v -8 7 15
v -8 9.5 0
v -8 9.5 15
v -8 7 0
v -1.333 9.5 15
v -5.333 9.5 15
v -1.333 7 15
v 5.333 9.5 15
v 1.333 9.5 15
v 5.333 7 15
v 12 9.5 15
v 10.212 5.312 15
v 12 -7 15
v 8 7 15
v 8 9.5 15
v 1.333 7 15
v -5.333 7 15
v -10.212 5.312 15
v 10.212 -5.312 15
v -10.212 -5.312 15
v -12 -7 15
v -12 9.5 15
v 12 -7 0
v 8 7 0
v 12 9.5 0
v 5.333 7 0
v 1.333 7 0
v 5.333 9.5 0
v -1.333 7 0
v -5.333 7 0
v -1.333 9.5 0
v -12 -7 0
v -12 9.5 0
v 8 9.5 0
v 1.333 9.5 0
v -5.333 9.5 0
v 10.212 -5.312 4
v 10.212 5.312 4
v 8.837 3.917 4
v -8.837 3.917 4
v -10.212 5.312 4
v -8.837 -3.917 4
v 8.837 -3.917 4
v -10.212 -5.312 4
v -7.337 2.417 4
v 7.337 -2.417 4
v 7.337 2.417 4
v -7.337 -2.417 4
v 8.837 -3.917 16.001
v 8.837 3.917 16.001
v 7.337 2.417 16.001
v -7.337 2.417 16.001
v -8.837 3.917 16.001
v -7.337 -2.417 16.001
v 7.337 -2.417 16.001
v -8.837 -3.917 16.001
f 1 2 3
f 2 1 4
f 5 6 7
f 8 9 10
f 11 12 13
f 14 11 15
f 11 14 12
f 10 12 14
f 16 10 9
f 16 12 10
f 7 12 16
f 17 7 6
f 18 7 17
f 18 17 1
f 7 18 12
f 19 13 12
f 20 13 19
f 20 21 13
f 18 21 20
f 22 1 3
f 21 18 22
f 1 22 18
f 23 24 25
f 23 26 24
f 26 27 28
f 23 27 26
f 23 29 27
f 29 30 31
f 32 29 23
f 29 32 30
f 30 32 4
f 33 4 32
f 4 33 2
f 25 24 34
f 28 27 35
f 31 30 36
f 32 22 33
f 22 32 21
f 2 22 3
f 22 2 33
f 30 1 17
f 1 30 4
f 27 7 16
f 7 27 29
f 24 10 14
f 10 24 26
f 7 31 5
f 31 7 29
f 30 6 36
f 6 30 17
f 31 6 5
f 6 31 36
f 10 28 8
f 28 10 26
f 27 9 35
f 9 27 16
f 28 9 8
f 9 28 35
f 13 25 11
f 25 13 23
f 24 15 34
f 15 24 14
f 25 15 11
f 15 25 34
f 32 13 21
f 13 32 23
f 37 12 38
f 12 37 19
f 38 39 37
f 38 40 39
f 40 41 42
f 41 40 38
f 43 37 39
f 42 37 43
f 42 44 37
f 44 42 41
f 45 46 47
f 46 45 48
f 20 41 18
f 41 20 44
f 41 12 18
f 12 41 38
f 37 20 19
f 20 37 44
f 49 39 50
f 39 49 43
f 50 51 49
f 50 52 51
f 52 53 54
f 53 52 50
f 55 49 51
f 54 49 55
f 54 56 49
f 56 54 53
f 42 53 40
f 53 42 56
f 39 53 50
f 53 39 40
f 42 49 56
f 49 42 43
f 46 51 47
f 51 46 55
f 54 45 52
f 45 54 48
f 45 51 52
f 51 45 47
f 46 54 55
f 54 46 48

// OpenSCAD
$fn = 150;

///////// Variables
outside_h = 15;
inside_h = 16;

outside_cutout_w = 20.3 + .125;
outside_cutout_d = 10.5 + .125;
inside_cutout_w = 17.8 - .125;
inside_cutout_d = 7.96 - .125;

main_box_w = 24;
main_box_d = 14;
small_box_w = 4;
small_box_d = 2.5;

main_z_offset = outside_h / 2;
main_z_cutout_offset = main_z_offset + 4;
inside_z_offset = inside_h / 2;
inside_z_cutout_offset = main_z_cutout_offset;

///////// Code
difference() {
  translate([0, 0, main_z_offset]) {
    // Main box
    cube([main_box_w, main_box_d, outside_h], center=true);

    // Small boxes
    num_small_boxes = 4;
    // This formula distributes them evenly
    small_box_spacing = ( (main_box_w - small_box_w) / (num_small_boxes - 1));
    start = -(main_box_w / 2) + (small_box_w / 2);
    y_offset = (main_box_d / 2) + (small_box_d / 2);
    // Top boxes
    for (i = [0:3]) {
      translate([start + (small_box_spacing * i), y_offset, 0]) {
        cube([small_box_w, small_box_d, outside_h], center=true);
      }
    }
  }

  // Cutout to cover outside
  translate([0, 0, main_z_cutout_offset]) {
    cube([outside_cutout_w, outside_cutout_d, outside_h], center=true);
  }
}

difference() {
  translate([0, 0, inside_z_offset + 0.001]) {
    // Inside box
    cube([inside_cutout_w, inside_cutout_d, inside_h], center=true);
  }

  // Cutout to cover outside
  translate([0, 0, inside_z_offset + 1]) {
    cube([inside_cutout_w - 3, inside_cutout_d - 3, inside_h], center=true);
  }
}
